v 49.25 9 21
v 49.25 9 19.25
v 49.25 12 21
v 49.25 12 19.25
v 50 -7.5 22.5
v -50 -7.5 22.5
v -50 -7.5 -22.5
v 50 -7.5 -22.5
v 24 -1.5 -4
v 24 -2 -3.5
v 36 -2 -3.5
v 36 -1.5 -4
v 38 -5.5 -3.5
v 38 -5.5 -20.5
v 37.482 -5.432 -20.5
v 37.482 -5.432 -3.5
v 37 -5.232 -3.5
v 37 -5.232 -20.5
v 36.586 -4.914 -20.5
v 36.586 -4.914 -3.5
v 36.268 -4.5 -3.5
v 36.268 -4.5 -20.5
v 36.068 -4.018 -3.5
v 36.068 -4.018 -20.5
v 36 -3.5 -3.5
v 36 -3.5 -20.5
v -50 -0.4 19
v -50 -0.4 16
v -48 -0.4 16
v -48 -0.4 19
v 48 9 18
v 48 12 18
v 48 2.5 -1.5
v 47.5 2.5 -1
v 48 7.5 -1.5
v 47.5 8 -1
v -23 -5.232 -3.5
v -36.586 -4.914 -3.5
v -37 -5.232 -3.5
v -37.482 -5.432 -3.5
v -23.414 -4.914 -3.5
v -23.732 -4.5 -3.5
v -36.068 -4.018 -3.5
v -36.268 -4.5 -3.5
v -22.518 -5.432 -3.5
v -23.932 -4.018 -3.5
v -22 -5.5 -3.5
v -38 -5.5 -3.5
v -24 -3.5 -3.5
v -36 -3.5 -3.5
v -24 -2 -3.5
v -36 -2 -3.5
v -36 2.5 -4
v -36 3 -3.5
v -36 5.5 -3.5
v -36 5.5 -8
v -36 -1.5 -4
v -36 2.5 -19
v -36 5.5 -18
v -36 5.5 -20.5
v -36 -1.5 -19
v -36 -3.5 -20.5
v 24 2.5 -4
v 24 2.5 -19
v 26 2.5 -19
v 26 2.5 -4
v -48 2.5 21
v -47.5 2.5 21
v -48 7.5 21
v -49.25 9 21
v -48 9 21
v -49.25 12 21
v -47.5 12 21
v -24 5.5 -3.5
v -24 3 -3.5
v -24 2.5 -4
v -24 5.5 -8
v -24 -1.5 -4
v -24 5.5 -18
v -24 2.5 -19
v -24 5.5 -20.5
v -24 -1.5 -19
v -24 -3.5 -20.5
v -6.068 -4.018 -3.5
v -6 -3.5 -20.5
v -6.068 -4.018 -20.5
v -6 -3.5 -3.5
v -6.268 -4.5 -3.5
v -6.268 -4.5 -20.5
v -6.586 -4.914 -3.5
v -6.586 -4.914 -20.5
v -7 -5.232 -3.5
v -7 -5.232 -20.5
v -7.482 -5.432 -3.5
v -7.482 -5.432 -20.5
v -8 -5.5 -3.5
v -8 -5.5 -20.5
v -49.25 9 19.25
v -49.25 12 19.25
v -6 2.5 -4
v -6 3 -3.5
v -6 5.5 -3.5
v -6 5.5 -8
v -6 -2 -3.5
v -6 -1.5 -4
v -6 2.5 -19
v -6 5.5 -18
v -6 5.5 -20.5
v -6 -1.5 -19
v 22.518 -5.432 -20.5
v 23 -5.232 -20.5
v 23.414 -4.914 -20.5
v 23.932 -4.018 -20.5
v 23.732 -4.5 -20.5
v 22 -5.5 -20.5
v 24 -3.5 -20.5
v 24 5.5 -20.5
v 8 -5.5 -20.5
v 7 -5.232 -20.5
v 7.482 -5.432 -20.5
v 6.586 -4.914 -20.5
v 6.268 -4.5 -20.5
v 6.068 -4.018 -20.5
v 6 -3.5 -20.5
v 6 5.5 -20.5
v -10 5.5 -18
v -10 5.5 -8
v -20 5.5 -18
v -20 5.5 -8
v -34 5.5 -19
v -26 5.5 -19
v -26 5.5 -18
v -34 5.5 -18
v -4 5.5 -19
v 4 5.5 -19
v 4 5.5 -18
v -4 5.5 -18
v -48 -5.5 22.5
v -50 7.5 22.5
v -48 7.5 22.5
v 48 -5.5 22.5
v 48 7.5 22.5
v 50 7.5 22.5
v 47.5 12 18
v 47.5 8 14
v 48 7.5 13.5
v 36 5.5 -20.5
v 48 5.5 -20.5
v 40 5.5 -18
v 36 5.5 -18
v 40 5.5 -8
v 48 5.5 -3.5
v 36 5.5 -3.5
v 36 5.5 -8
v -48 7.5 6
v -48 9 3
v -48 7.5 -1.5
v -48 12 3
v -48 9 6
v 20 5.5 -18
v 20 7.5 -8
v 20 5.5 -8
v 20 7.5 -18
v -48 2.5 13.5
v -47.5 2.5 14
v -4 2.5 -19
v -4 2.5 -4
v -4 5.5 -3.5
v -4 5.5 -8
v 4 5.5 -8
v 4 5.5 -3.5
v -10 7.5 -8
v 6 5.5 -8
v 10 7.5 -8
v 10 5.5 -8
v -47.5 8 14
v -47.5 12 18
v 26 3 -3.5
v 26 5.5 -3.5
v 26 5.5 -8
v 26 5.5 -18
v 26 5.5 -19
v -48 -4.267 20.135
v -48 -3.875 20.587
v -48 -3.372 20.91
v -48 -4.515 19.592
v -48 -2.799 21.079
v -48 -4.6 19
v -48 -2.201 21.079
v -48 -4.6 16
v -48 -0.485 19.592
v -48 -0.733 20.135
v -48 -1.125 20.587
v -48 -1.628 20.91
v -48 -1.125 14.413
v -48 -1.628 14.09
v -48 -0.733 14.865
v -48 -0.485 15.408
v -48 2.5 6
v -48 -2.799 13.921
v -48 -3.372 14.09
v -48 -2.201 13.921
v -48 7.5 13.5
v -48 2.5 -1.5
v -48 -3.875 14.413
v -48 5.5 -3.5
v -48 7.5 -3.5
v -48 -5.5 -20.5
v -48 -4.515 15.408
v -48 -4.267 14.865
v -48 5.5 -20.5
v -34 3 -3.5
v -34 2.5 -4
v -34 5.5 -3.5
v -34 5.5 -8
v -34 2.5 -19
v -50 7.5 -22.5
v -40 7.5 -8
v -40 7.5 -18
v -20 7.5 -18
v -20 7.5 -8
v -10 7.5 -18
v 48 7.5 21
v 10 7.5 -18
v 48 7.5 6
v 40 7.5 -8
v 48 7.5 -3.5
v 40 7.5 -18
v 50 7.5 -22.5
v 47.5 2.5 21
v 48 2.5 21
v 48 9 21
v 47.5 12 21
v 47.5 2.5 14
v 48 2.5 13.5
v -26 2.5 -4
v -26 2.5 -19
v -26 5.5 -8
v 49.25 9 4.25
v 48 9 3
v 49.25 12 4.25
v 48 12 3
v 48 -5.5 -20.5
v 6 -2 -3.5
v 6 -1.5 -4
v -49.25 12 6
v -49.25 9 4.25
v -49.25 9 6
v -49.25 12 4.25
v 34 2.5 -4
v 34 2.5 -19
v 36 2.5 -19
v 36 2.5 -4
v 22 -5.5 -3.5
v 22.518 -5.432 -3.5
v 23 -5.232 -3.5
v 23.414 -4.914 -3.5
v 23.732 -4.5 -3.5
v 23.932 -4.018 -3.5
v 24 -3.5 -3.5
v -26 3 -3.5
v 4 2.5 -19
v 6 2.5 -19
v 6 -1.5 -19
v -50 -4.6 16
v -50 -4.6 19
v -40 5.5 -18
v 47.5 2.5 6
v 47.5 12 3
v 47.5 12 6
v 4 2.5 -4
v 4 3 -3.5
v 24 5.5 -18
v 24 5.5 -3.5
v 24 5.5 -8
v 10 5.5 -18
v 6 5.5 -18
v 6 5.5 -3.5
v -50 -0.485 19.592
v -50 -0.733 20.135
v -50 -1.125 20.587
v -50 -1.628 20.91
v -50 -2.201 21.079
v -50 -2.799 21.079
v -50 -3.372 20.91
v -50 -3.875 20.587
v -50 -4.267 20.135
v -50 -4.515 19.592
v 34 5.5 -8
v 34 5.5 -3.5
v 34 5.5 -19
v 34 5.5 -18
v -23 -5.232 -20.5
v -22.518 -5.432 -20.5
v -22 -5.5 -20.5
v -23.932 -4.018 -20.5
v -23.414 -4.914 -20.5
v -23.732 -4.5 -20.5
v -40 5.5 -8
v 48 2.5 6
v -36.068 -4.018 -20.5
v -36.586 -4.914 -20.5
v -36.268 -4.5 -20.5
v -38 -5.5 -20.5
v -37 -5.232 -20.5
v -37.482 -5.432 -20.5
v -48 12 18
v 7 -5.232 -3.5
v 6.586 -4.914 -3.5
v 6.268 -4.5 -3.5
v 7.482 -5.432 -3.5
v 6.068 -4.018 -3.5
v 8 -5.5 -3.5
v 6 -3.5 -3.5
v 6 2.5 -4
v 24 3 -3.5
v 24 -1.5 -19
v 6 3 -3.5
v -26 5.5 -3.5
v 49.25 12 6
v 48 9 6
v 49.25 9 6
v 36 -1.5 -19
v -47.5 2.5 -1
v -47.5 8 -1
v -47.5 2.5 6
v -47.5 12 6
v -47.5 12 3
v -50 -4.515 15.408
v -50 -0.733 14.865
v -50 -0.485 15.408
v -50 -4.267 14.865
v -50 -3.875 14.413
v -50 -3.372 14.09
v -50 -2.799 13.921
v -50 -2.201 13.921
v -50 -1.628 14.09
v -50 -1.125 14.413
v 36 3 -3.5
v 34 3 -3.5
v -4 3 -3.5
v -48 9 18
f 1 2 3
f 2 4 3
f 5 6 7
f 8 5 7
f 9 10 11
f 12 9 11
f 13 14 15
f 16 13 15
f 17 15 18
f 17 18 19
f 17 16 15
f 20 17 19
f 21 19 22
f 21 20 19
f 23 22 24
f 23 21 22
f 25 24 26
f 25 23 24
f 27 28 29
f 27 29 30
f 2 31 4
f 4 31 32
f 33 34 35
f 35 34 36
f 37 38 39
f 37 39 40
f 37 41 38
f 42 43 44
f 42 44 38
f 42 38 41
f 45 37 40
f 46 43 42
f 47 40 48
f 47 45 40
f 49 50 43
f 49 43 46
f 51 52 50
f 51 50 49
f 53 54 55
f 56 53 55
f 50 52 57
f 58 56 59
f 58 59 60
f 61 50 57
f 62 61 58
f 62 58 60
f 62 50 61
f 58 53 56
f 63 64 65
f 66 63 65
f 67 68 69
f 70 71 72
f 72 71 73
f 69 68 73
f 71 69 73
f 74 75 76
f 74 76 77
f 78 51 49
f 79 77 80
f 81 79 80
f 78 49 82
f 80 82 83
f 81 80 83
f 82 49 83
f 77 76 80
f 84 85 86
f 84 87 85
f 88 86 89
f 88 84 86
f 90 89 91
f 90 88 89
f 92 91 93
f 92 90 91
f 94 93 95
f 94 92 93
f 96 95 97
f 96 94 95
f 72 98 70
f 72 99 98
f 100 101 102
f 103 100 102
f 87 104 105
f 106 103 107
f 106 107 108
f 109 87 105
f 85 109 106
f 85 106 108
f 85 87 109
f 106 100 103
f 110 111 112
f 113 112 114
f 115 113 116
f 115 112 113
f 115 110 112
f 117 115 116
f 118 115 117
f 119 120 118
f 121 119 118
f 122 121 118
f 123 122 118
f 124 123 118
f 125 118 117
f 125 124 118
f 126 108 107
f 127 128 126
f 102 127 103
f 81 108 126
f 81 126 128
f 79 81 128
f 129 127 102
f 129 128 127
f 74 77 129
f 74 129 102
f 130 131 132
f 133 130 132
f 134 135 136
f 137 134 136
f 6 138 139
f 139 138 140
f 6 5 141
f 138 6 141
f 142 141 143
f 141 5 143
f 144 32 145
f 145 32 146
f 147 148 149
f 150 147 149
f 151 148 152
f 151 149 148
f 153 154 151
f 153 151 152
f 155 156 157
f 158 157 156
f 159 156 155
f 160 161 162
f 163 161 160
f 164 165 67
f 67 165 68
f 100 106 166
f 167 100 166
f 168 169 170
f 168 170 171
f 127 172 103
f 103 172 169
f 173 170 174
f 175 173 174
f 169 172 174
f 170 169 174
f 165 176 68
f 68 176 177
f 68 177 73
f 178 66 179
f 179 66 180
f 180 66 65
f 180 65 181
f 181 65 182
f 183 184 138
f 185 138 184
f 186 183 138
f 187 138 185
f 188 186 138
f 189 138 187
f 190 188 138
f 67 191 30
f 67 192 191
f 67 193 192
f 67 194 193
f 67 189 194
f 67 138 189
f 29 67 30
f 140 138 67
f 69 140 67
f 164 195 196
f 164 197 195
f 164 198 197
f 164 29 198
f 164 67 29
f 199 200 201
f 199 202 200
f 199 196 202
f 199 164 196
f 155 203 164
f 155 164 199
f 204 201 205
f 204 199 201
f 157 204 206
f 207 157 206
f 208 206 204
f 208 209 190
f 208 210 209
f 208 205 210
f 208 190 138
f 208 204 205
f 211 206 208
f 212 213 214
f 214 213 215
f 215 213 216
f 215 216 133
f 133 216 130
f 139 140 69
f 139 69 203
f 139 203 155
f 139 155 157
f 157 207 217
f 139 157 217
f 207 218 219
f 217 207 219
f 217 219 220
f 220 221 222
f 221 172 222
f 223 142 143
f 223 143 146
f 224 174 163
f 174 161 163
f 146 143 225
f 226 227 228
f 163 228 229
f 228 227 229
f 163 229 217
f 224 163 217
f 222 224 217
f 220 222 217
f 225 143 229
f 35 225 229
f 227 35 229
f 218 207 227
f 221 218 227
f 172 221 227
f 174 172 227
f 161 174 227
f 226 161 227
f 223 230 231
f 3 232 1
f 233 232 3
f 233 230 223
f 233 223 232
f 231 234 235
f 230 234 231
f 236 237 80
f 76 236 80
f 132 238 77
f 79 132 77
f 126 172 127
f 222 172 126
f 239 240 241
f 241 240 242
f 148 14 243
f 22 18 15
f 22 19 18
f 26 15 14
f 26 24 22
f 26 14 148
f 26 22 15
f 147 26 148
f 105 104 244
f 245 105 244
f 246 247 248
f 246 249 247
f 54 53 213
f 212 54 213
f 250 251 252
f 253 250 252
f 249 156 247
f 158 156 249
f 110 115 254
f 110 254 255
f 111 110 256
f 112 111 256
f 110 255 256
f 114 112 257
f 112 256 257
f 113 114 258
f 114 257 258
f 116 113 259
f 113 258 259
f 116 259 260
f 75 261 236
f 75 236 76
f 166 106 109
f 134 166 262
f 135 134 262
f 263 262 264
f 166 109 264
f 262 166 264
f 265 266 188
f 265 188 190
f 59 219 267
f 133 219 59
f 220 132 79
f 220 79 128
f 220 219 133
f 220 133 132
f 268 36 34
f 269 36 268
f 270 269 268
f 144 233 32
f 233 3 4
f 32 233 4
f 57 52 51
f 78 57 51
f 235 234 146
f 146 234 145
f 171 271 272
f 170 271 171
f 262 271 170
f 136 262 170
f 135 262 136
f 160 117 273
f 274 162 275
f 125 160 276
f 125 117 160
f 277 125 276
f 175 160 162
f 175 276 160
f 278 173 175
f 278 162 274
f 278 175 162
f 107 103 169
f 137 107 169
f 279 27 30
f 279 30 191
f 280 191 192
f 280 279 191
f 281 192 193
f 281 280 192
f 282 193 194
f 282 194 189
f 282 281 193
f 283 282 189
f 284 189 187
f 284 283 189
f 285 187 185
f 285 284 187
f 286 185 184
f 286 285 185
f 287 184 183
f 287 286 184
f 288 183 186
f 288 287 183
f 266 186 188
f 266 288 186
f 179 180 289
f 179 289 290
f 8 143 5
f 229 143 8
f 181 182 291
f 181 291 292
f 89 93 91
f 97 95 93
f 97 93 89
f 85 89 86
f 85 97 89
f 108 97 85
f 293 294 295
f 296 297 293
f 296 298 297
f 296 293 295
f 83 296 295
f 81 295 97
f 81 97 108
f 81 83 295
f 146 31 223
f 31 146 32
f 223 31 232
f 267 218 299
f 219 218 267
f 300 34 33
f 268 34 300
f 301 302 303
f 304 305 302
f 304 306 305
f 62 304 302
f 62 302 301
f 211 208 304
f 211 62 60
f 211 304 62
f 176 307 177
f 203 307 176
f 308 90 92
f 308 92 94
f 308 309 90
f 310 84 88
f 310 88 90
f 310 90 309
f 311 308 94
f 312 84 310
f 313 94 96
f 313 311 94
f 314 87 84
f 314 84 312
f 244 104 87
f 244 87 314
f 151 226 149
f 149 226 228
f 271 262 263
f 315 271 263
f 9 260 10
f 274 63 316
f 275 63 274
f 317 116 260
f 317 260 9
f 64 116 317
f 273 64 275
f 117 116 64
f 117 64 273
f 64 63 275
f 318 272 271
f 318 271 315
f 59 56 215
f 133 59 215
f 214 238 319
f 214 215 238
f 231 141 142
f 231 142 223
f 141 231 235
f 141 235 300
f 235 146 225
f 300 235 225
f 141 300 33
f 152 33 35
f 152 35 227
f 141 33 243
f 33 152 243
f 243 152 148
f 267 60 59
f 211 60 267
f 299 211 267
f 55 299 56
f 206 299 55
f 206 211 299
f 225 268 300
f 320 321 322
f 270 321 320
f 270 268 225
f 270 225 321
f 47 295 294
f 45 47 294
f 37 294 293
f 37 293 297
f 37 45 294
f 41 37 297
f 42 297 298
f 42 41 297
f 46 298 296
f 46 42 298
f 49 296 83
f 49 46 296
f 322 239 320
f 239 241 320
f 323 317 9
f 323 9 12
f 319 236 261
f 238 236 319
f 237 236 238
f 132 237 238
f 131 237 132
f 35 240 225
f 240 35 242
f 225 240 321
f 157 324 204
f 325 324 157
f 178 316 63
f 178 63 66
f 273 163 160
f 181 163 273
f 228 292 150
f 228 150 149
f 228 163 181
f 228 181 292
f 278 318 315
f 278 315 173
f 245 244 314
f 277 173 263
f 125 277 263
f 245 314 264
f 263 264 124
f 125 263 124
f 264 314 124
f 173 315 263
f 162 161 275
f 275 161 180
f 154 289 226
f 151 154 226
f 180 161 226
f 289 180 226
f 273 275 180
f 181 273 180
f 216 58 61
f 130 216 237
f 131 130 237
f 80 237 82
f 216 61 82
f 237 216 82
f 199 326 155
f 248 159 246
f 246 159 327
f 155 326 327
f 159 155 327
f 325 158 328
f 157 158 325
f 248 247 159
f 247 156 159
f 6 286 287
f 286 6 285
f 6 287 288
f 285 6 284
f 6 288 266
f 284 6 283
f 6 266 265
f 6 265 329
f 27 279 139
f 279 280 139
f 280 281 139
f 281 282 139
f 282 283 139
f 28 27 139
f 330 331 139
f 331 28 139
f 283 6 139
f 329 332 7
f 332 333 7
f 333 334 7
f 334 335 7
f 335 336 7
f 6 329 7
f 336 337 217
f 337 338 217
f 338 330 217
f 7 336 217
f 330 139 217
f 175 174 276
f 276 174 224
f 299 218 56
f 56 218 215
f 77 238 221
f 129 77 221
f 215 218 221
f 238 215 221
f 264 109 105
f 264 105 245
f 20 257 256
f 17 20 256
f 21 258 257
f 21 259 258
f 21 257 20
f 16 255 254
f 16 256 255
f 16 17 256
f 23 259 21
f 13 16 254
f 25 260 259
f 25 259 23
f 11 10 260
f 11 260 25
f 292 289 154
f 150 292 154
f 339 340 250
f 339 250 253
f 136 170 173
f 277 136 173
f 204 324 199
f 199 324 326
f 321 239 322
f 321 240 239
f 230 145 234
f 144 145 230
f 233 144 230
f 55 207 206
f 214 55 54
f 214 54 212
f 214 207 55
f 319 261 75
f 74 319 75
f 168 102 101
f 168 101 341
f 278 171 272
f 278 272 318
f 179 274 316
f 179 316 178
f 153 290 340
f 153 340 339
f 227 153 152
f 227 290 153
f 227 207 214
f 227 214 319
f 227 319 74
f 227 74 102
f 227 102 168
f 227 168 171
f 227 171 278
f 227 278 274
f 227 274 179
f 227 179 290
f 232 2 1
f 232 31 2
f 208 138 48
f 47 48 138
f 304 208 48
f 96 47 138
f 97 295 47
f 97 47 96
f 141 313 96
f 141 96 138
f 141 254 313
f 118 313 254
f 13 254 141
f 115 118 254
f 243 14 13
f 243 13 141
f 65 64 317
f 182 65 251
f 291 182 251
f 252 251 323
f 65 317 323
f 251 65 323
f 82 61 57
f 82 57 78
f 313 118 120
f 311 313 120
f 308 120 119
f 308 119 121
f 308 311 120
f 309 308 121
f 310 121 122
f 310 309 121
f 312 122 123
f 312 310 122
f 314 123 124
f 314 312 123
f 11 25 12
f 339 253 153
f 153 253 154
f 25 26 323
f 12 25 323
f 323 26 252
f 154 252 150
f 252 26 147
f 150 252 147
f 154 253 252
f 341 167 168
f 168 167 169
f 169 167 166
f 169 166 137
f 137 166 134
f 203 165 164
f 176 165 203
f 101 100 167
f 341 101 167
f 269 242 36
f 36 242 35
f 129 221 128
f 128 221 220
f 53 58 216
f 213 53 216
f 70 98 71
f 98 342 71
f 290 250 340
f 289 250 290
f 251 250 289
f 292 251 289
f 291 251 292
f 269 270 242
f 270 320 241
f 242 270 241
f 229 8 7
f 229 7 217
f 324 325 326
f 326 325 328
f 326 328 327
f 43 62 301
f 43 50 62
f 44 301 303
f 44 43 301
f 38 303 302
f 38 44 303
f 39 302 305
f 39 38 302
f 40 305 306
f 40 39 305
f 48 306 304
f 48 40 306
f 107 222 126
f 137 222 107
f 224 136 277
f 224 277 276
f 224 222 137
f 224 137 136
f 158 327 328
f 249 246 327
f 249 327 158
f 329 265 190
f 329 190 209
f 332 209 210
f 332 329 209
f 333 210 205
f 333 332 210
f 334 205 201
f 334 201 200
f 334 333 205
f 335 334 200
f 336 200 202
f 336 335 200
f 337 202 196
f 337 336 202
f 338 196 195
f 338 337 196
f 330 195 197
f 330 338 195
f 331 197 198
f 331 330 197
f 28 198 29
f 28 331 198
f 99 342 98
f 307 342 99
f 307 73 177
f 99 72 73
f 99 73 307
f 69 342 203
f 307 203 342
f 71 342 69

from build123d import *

# Parameters (mm, degrees)
SKETCH1_W                  = 45
SKETCH1_H                  = 15
BOSS_EXTRUDE1_DEPTH        = 50
SKETCH2_W                  = 96
SKETCH2_H                  = 26
CUT_EXTRUDE1_DEPTH         = 13
SHELL1_START               = -48
SHELL1_OUTLINE_W           = 11
SHELL1_OUTLINE_H           = 17
SHELL1_DEPTH               = 96
SKETCH3_W                  = 20
SKETCH3_H                  = 10
CUT_EXTRUDE2_DEPTH         = 2
LPATTERN1_COUNT            = 2
LPATTERN1_PITCH            = 30
LPATTERN1_COL_COUNT        = 2
LPATTERN1_COL_PITCH        = 30
BOSS_EXTRUDE2_REACH        = 68.372
SKETCH4_W                  = 12
SKETCH4_H                  = 4
SKETCH4_W_2                = 2
SKETCH4_H_2                = 3
SKETCH5_W                  = 12
SKETCH5_H                  = 1.5
BOSS_EXTRUDE3_DEPTH        = 7
CHAMFER1_SIZE              = 0.5
FILLET1_R                  = 2
LPATTERN2_COUNT            = 3
LPATTERN2_PITCH            = 30
CHAMFER1_OF_LPATTERN2_SIZE = 0.5
FILLET1_OF_LPATTERN2_R     = 2
SKETCH6_W                  = 3
SKETCH6_H                  = 3
BOSS_EXTRUDE4_DEPTH        = 1.25
BOSS_EXTRUDE4_2_DEPTH      = 1.25
BOSS_EXTRUDE5_DEPTH        = 0.5
SKETCH8_W                  = 7.5
SKETCH8_H                  = 5
BOSS_EXTRUDE6_DEPTH        = 0.5
CHAMFER2_SIZE              = 0.5
CHAMFER4_SIZE              = 1.25
CHAMFER2_OF_MIRROR7_SIZE   = 0.5
CHAMFER4_OF_MIRROR7_SIZE   = 1.25
CUT_EXTRUDE3_DEPTH         = 2


# Read off the part's stored shape, not the designer's step: Shell1
with BuildPart() as part:
    # Sketch1 → Boss-Extrude1 (new, symmetric)
    with BuildSketch(Plane(origin=(0, 0, 0), x_dir=(0, 0, -1), z_dir=(1, 0, 0))):
        Rectangle(SKETCH1_W, SKETCH1_H)
    extrude(amount=BOSS_EXTRUDE1_DEPTH, both=True)

    # Sketch2 → Cut-Extrude1 (cut)
    with BuildSketch(Plane(origin=(0, 7.5, 0), x_dir=(1, 0, 0), z_dir=(0, 1, 0))):
        with Locations((0, -9.5)):
            Rectangle(SKETCH2_W, SKETCH2_H)
    extrude(amount=-CUT_EXTRUDE1_DEPTH, mode=Mode.SUBTRACT)

    # Shell1 outline → Shell1 (cut)
    with BuildSketch(Plane.YZ.offset(SHELL1_START)):
        with Locations((0, -12)):
            Rectangle(SHELL1_OUTLINE_W, SHELL1_OUTLINE_H)
    extrude(amount=SHELL1_DEPTH, mode=Mode.SUBTRACT)

    # Sketch3 → Cut-Extrude2 (cut)
    with BuildSketch(Plane(origin=(0, 7.5, 0), x_dir=(1, 0, 0), z_dir=(0, 1, 0))):
        with Locations((0, 13)):
            Rectangle(SKETCH3_W, SKETCH3_H)
    cut_extrude2 = extrude(amount=-CUT_EXTRUDE2_DEPTH, mode=Mode.SUBTRACT)

    # LPattern1: Cut-Extrude2 ×2
    with Locations(*[(-i * LPATTERN1_PITCH, 0, 0) for i in range(1, LPATTERN1_COUNT)]):
        add(cut_extrude2, mode=Mode.SUBTRACT)

    # LPattern1 col: Cut-Extrude2 ×2
    with Locations(*[(i * LPATTERN1_COL_PITCH, 0, 0) for i in range(1, LPATTERN1_COL_COUNT)]):
        add(cut_extrude2, mode=Mode.SUBTRACT)

    # Boss-Extrude2: up to this face of the body (flat: up to its plane)
    boss_extrude2_end = Plane(part.part.faces().sort_by_distance((0, 6.5, -3.5))[0])
    # Sketch4 → Boss-Extrude2 (add, up to the picked face)
    with BuildSketch(Plane.XY.offset(-20.5), mode=Mode.PRIVATE) as boss_extrude2_sk1:
        with Locations((-30, -3.5)):
            Rectangle(SKETCH4_W, SKETCH4_H)
    boss_extrude2_tool1 = split(extrude(boss_extrude2_sk1.sketch, amount=BOSS_EXTRUDE2_REACH, mode=Mode.PRIVATE), bisect_by=boss_extrude2_end, keep=Keep.BOTH, mode=Mode.PRIVATE)
    # Sketch4 → Boss-Extrude2 (add, up to the picked face)
    with BuildSketch(Plane.XY.offset(-20.5), mode=Mode.PRIVATE) as boss_extrude2_sk2:
        with Locations((-35, 4)):
            Rectangle(SKETCH4_W_2, SKETCH4_H_2)
    boss_extrude2_tool2 = split(extrude(boss_extrude2_sk2.sketch, amount=BOSS_EXTRUDE2_REACH, mode=Mode.PRIVATE), bisect_by=boss_extrude2_end, keep=Keep.BOTH, mode=Mode.PRIVATE)
    # Sketch4 → Boss-Extrude2 (add, up to the picked face)
    with BuildSketch(Plane.XY.offset(-20.5), mode=Mode.PRIVATE) as boss_extrude2_sk3:
        with Locations((-25, 4)):
            Rectangle(SKETCH4_W_2, SKETCH4_H_2)
    boss_extrude2_tool3 = split(extrude(boss_extrude2_sk3.sketch, amount=BOSS_EXTRUDE2_REACH, mode=Mode.PRIVATE), bisect_by=boss_extrude2_end, keep=Keep.BOTH, mode=Mode.PRIVATE)
    boss_extrude2_1 = boss_extrude2_tool1.solids().sort_by(Axis((-30, -3.5, -20.5), (0, 0, 1)))[0]
    add(boss_extrude2_1)
    boss_extrude2_2 = boss_extrude2_tool2.solids().sort_by(Axis((-35, 4, -20.5), (0, 0, 1)))[0]
    add(boss_extrude2_2)
    boss_extrude2_3 = boss_extrude2_tool3.solids().sort_by(Axis((-25, 4, -20.5), (0, 0, 1)))[0]
    add(boss_extrude2_3)
    boss_extrude2 = boss_extrude2_1 + boss_extrude2_2 + boss_extrude2_3  # Boss-Extrude2 as one shape, for the pattern or mirror that repeats it

    # Sketch5 → Boss-Extrude3 (add)
    with BuildSketch(Plane(origin=(0, -1.5, 0), x_dir=(1, 0, 0), z_dir=(0, 1, 0))):
        with Locations((-30, 19.75)):
            Rectangle(SKETCH5_W, SKETCH5_H)
    boss_extrude3 = extrude(amount=BOSS_EXTRUDE3_DEPTH)

    # Chamfer1
    chamfer1_edges = [part.edges().sort_by_distance(p)[0] for p in [
        (-35, 2.5, -3.5),
        (-25, 2.5, -3.5),
        (-30, -1.5, -3.5),
    ]]
    chamfer(chamfer1_edges, length=CHAMFER1_SIZE)

    # Fillet1
    fillet1_edges = [part.edges().sort_by_distance(p)[0] for p in [
        (-24, -5.5, -12),
        (-36, -5.5, -12),
    ]]
    fillet(fillet1_edges, radius=FILLET1_R)

    # LPattern2: Boss-Extrude2, Boss-Extrude3 ×3
    with Locations(*[(i * LPATTERN2_PITCH, 0, 0) for i in range(1, LPATTERN2_COUNT)]):
        add(boss_extrude2)
        add(boss_extrude3)

    # Chamfer1 of LPattern2
    chamfer1_of_lpattern2_edges = [part.edges().sort_by_distance(p)[0] for p in [
        (-5, 2.5, -3.5),
        (5, 2.5, -3.5),
        (0, -1.5, -3.5),
        (25, 2.5, -3.5),
        (35, 2.5, -3.5),
        (30, -1.5, -3.5),
    ]]
    chamfer(chamfer1_of_lpattern2_edges, length=CHAMFER1_OF_LPATTERN2_SIZE)

    # Fillet1 of LPattern2
    fillet1_of_lpattern2_edges = [part.edges().sort_by_distance(p)[0] for p in [
        (6, -5.5, -12),
        (-6, -5.5, -12),
        (36, -5.5, -12),
        (24, -5.5, -12),
    ]]
    fillet(fillet1_of_lpattern2_edges, radius=FILLET1_OF_LPATTERN2_R)



with BuildPart() as body_2:
    # Sketch6 → Boss-Extrude4 (new body)
    with BuildSketch(Plane.ZY.offset(-48)):
        with Locations((19.5, 10.5)):
            Rectangle(SKETCH6_W, SKETCH6_H)
    boss_extrude4 = extrude(amount=-BOSS_EXTRUDE4_DEPTH)



with BuildPart() as body_3:
    # Sketch6 → Boss-Extrude4 2 (new body)
    with BuildSketch(Plane.ZY.offset(-48)):
        with Locations((4.5, 10.5)):
            Rectangle(SKETCH6_W, SKETCH6_H)
    boss_extrude4_2 = extrude(amount=-BOSS_EXTRUDE4_2_DEPTH)


with BuildPart() as body_2_1:
    add(body_2.part)

    add(body_3.part)  # Boss-Extrude5 merges body 3
    # Sketch7 → Boss-Extrude5 (add)
    with BuildSketch(Plane.ZY.offset(-48)):
        Polygon((18, 12), (13.5, 7.5), (21, 7.5), (21, 12), align=None)
        Polygon((3, 12), (-1.5, 7.5), (6, 7.5), (6, 12), align=None)
    boss_extrude5 = extrude(amount=BOSS_EXTRUDE5_DEPTH)


with BuildPart() as part_1:
    add(part.part)

    add(body_2_1.part)  # Boss-Extrude6 merges body 2
    # Sketch8 → Boss-Extrude6 (add)
    with BuildSketch(Plane.ZY.offset(-47.5)):
        with Locations((2.25, 5)):
            Rectangle(SKETCH8_W, SKETCH8_H)
        with Locations((17.25, 5)):
            Rectangle(SKETCH8_W, SKETCH8_H)
    boss_extrude6 = extrude(amount=-BOSS_EXTRUDE6_DEPTH)

    # Chamfer2
    chamfer2_edges = [part_1.edges().sort_by_distance(p)[0] for p in [
        (47.5, 5, -1.5),
        (47.5, 5, 13.5),
    ]]
    chamfer(chamfer2_edges, length=CHAMFER2_SIZE - 0.0001)  # a hair under: the kernel refuses the full size

    # Chamfer4
    chamfer4_edges = [part_1.edges().sort_by_distance(p)[0] for p in [
        (49.25, 10.5, 3),
        (49.25, 10.5, 18),
    ]]
    chamfer(chamfer4_edges, length=CHAMFER4_SIZE - 0.0001)  # a hair under: the kernel refuses the full size

    # Mirror7: Boss-Extrude4, Boss-Extrude4 2, Boss-Extrude5, Boss-Extrude6 across plane
    add(boss_extrude4.mirror(Plane(origin=(0, 0, 0), x_dir=(0, 0, 1), z_dir=(1, 0, 0))))
    add(boss_extrude4_2.mirror(Plane(origin=(0, 0, 0), x_dir=(0, 0, 1), z_dir=(1, 0, 0))))
    add(boss_extrude5.mirror(Plane(origin=(0, 0, 0), x_dir=(0, 0, 1), z_dir=(1, 0, 0))))
    add(boss_extrude6.mirror(Plane(origin=(0, 0, 0), x_dir=(0, 0, 1), z_dir=(1, 0, 0))))

    # Chamfer2 of Mirror7
    chamfer2_of_mirror7_edges = [part_1.edges().sort_by_distance(p)[0] for p in [
        (-47.5, 5, -1.5),
        (-47.5, 5, 13.5),
    ]]
    chamfer(chamfer2_of_mirror7_edges, length=CHAMFER2_OF_MIRROR7_SIZE - 0.0001)  # a hair under: the kernel refuses the full size

    # Chamfer4 of Mirror7
    chamfer4_of_mirror7_edges = [part_1.edges().sort_by_distance(p)[0] for p in [
        (-49.25, 10.5, 3),
        (-49.25, 10.5, 18),
    ]]
    chamfer(chamfer4_of_mirror7_edges, length=CHAMFER4_OF_MIRROR7_SIZE - 0.0001)  # a hair under: the kernel refuses the full size

    # Sketch10 → Cut-Extrude3 (cut)
    with BuildSketch(Plane.ZY.offset(50)):
        with BuildLine():
            Line((19, -4.6), (16, -4.6))
            ThreePointArc((16, -4.6), (13.9, -2.5), (16, -0.4))
            Line((16, -0.4), (19, -0.4))
            ThreePointArc((19, -0.4), (21.1, -2.5), (19, -4.6))
        make_face()
    extrude(amount=-CUT_EXTRUDE3_DEPTH, mode=Mode.SUBTRACT)


solid = part_1.part
